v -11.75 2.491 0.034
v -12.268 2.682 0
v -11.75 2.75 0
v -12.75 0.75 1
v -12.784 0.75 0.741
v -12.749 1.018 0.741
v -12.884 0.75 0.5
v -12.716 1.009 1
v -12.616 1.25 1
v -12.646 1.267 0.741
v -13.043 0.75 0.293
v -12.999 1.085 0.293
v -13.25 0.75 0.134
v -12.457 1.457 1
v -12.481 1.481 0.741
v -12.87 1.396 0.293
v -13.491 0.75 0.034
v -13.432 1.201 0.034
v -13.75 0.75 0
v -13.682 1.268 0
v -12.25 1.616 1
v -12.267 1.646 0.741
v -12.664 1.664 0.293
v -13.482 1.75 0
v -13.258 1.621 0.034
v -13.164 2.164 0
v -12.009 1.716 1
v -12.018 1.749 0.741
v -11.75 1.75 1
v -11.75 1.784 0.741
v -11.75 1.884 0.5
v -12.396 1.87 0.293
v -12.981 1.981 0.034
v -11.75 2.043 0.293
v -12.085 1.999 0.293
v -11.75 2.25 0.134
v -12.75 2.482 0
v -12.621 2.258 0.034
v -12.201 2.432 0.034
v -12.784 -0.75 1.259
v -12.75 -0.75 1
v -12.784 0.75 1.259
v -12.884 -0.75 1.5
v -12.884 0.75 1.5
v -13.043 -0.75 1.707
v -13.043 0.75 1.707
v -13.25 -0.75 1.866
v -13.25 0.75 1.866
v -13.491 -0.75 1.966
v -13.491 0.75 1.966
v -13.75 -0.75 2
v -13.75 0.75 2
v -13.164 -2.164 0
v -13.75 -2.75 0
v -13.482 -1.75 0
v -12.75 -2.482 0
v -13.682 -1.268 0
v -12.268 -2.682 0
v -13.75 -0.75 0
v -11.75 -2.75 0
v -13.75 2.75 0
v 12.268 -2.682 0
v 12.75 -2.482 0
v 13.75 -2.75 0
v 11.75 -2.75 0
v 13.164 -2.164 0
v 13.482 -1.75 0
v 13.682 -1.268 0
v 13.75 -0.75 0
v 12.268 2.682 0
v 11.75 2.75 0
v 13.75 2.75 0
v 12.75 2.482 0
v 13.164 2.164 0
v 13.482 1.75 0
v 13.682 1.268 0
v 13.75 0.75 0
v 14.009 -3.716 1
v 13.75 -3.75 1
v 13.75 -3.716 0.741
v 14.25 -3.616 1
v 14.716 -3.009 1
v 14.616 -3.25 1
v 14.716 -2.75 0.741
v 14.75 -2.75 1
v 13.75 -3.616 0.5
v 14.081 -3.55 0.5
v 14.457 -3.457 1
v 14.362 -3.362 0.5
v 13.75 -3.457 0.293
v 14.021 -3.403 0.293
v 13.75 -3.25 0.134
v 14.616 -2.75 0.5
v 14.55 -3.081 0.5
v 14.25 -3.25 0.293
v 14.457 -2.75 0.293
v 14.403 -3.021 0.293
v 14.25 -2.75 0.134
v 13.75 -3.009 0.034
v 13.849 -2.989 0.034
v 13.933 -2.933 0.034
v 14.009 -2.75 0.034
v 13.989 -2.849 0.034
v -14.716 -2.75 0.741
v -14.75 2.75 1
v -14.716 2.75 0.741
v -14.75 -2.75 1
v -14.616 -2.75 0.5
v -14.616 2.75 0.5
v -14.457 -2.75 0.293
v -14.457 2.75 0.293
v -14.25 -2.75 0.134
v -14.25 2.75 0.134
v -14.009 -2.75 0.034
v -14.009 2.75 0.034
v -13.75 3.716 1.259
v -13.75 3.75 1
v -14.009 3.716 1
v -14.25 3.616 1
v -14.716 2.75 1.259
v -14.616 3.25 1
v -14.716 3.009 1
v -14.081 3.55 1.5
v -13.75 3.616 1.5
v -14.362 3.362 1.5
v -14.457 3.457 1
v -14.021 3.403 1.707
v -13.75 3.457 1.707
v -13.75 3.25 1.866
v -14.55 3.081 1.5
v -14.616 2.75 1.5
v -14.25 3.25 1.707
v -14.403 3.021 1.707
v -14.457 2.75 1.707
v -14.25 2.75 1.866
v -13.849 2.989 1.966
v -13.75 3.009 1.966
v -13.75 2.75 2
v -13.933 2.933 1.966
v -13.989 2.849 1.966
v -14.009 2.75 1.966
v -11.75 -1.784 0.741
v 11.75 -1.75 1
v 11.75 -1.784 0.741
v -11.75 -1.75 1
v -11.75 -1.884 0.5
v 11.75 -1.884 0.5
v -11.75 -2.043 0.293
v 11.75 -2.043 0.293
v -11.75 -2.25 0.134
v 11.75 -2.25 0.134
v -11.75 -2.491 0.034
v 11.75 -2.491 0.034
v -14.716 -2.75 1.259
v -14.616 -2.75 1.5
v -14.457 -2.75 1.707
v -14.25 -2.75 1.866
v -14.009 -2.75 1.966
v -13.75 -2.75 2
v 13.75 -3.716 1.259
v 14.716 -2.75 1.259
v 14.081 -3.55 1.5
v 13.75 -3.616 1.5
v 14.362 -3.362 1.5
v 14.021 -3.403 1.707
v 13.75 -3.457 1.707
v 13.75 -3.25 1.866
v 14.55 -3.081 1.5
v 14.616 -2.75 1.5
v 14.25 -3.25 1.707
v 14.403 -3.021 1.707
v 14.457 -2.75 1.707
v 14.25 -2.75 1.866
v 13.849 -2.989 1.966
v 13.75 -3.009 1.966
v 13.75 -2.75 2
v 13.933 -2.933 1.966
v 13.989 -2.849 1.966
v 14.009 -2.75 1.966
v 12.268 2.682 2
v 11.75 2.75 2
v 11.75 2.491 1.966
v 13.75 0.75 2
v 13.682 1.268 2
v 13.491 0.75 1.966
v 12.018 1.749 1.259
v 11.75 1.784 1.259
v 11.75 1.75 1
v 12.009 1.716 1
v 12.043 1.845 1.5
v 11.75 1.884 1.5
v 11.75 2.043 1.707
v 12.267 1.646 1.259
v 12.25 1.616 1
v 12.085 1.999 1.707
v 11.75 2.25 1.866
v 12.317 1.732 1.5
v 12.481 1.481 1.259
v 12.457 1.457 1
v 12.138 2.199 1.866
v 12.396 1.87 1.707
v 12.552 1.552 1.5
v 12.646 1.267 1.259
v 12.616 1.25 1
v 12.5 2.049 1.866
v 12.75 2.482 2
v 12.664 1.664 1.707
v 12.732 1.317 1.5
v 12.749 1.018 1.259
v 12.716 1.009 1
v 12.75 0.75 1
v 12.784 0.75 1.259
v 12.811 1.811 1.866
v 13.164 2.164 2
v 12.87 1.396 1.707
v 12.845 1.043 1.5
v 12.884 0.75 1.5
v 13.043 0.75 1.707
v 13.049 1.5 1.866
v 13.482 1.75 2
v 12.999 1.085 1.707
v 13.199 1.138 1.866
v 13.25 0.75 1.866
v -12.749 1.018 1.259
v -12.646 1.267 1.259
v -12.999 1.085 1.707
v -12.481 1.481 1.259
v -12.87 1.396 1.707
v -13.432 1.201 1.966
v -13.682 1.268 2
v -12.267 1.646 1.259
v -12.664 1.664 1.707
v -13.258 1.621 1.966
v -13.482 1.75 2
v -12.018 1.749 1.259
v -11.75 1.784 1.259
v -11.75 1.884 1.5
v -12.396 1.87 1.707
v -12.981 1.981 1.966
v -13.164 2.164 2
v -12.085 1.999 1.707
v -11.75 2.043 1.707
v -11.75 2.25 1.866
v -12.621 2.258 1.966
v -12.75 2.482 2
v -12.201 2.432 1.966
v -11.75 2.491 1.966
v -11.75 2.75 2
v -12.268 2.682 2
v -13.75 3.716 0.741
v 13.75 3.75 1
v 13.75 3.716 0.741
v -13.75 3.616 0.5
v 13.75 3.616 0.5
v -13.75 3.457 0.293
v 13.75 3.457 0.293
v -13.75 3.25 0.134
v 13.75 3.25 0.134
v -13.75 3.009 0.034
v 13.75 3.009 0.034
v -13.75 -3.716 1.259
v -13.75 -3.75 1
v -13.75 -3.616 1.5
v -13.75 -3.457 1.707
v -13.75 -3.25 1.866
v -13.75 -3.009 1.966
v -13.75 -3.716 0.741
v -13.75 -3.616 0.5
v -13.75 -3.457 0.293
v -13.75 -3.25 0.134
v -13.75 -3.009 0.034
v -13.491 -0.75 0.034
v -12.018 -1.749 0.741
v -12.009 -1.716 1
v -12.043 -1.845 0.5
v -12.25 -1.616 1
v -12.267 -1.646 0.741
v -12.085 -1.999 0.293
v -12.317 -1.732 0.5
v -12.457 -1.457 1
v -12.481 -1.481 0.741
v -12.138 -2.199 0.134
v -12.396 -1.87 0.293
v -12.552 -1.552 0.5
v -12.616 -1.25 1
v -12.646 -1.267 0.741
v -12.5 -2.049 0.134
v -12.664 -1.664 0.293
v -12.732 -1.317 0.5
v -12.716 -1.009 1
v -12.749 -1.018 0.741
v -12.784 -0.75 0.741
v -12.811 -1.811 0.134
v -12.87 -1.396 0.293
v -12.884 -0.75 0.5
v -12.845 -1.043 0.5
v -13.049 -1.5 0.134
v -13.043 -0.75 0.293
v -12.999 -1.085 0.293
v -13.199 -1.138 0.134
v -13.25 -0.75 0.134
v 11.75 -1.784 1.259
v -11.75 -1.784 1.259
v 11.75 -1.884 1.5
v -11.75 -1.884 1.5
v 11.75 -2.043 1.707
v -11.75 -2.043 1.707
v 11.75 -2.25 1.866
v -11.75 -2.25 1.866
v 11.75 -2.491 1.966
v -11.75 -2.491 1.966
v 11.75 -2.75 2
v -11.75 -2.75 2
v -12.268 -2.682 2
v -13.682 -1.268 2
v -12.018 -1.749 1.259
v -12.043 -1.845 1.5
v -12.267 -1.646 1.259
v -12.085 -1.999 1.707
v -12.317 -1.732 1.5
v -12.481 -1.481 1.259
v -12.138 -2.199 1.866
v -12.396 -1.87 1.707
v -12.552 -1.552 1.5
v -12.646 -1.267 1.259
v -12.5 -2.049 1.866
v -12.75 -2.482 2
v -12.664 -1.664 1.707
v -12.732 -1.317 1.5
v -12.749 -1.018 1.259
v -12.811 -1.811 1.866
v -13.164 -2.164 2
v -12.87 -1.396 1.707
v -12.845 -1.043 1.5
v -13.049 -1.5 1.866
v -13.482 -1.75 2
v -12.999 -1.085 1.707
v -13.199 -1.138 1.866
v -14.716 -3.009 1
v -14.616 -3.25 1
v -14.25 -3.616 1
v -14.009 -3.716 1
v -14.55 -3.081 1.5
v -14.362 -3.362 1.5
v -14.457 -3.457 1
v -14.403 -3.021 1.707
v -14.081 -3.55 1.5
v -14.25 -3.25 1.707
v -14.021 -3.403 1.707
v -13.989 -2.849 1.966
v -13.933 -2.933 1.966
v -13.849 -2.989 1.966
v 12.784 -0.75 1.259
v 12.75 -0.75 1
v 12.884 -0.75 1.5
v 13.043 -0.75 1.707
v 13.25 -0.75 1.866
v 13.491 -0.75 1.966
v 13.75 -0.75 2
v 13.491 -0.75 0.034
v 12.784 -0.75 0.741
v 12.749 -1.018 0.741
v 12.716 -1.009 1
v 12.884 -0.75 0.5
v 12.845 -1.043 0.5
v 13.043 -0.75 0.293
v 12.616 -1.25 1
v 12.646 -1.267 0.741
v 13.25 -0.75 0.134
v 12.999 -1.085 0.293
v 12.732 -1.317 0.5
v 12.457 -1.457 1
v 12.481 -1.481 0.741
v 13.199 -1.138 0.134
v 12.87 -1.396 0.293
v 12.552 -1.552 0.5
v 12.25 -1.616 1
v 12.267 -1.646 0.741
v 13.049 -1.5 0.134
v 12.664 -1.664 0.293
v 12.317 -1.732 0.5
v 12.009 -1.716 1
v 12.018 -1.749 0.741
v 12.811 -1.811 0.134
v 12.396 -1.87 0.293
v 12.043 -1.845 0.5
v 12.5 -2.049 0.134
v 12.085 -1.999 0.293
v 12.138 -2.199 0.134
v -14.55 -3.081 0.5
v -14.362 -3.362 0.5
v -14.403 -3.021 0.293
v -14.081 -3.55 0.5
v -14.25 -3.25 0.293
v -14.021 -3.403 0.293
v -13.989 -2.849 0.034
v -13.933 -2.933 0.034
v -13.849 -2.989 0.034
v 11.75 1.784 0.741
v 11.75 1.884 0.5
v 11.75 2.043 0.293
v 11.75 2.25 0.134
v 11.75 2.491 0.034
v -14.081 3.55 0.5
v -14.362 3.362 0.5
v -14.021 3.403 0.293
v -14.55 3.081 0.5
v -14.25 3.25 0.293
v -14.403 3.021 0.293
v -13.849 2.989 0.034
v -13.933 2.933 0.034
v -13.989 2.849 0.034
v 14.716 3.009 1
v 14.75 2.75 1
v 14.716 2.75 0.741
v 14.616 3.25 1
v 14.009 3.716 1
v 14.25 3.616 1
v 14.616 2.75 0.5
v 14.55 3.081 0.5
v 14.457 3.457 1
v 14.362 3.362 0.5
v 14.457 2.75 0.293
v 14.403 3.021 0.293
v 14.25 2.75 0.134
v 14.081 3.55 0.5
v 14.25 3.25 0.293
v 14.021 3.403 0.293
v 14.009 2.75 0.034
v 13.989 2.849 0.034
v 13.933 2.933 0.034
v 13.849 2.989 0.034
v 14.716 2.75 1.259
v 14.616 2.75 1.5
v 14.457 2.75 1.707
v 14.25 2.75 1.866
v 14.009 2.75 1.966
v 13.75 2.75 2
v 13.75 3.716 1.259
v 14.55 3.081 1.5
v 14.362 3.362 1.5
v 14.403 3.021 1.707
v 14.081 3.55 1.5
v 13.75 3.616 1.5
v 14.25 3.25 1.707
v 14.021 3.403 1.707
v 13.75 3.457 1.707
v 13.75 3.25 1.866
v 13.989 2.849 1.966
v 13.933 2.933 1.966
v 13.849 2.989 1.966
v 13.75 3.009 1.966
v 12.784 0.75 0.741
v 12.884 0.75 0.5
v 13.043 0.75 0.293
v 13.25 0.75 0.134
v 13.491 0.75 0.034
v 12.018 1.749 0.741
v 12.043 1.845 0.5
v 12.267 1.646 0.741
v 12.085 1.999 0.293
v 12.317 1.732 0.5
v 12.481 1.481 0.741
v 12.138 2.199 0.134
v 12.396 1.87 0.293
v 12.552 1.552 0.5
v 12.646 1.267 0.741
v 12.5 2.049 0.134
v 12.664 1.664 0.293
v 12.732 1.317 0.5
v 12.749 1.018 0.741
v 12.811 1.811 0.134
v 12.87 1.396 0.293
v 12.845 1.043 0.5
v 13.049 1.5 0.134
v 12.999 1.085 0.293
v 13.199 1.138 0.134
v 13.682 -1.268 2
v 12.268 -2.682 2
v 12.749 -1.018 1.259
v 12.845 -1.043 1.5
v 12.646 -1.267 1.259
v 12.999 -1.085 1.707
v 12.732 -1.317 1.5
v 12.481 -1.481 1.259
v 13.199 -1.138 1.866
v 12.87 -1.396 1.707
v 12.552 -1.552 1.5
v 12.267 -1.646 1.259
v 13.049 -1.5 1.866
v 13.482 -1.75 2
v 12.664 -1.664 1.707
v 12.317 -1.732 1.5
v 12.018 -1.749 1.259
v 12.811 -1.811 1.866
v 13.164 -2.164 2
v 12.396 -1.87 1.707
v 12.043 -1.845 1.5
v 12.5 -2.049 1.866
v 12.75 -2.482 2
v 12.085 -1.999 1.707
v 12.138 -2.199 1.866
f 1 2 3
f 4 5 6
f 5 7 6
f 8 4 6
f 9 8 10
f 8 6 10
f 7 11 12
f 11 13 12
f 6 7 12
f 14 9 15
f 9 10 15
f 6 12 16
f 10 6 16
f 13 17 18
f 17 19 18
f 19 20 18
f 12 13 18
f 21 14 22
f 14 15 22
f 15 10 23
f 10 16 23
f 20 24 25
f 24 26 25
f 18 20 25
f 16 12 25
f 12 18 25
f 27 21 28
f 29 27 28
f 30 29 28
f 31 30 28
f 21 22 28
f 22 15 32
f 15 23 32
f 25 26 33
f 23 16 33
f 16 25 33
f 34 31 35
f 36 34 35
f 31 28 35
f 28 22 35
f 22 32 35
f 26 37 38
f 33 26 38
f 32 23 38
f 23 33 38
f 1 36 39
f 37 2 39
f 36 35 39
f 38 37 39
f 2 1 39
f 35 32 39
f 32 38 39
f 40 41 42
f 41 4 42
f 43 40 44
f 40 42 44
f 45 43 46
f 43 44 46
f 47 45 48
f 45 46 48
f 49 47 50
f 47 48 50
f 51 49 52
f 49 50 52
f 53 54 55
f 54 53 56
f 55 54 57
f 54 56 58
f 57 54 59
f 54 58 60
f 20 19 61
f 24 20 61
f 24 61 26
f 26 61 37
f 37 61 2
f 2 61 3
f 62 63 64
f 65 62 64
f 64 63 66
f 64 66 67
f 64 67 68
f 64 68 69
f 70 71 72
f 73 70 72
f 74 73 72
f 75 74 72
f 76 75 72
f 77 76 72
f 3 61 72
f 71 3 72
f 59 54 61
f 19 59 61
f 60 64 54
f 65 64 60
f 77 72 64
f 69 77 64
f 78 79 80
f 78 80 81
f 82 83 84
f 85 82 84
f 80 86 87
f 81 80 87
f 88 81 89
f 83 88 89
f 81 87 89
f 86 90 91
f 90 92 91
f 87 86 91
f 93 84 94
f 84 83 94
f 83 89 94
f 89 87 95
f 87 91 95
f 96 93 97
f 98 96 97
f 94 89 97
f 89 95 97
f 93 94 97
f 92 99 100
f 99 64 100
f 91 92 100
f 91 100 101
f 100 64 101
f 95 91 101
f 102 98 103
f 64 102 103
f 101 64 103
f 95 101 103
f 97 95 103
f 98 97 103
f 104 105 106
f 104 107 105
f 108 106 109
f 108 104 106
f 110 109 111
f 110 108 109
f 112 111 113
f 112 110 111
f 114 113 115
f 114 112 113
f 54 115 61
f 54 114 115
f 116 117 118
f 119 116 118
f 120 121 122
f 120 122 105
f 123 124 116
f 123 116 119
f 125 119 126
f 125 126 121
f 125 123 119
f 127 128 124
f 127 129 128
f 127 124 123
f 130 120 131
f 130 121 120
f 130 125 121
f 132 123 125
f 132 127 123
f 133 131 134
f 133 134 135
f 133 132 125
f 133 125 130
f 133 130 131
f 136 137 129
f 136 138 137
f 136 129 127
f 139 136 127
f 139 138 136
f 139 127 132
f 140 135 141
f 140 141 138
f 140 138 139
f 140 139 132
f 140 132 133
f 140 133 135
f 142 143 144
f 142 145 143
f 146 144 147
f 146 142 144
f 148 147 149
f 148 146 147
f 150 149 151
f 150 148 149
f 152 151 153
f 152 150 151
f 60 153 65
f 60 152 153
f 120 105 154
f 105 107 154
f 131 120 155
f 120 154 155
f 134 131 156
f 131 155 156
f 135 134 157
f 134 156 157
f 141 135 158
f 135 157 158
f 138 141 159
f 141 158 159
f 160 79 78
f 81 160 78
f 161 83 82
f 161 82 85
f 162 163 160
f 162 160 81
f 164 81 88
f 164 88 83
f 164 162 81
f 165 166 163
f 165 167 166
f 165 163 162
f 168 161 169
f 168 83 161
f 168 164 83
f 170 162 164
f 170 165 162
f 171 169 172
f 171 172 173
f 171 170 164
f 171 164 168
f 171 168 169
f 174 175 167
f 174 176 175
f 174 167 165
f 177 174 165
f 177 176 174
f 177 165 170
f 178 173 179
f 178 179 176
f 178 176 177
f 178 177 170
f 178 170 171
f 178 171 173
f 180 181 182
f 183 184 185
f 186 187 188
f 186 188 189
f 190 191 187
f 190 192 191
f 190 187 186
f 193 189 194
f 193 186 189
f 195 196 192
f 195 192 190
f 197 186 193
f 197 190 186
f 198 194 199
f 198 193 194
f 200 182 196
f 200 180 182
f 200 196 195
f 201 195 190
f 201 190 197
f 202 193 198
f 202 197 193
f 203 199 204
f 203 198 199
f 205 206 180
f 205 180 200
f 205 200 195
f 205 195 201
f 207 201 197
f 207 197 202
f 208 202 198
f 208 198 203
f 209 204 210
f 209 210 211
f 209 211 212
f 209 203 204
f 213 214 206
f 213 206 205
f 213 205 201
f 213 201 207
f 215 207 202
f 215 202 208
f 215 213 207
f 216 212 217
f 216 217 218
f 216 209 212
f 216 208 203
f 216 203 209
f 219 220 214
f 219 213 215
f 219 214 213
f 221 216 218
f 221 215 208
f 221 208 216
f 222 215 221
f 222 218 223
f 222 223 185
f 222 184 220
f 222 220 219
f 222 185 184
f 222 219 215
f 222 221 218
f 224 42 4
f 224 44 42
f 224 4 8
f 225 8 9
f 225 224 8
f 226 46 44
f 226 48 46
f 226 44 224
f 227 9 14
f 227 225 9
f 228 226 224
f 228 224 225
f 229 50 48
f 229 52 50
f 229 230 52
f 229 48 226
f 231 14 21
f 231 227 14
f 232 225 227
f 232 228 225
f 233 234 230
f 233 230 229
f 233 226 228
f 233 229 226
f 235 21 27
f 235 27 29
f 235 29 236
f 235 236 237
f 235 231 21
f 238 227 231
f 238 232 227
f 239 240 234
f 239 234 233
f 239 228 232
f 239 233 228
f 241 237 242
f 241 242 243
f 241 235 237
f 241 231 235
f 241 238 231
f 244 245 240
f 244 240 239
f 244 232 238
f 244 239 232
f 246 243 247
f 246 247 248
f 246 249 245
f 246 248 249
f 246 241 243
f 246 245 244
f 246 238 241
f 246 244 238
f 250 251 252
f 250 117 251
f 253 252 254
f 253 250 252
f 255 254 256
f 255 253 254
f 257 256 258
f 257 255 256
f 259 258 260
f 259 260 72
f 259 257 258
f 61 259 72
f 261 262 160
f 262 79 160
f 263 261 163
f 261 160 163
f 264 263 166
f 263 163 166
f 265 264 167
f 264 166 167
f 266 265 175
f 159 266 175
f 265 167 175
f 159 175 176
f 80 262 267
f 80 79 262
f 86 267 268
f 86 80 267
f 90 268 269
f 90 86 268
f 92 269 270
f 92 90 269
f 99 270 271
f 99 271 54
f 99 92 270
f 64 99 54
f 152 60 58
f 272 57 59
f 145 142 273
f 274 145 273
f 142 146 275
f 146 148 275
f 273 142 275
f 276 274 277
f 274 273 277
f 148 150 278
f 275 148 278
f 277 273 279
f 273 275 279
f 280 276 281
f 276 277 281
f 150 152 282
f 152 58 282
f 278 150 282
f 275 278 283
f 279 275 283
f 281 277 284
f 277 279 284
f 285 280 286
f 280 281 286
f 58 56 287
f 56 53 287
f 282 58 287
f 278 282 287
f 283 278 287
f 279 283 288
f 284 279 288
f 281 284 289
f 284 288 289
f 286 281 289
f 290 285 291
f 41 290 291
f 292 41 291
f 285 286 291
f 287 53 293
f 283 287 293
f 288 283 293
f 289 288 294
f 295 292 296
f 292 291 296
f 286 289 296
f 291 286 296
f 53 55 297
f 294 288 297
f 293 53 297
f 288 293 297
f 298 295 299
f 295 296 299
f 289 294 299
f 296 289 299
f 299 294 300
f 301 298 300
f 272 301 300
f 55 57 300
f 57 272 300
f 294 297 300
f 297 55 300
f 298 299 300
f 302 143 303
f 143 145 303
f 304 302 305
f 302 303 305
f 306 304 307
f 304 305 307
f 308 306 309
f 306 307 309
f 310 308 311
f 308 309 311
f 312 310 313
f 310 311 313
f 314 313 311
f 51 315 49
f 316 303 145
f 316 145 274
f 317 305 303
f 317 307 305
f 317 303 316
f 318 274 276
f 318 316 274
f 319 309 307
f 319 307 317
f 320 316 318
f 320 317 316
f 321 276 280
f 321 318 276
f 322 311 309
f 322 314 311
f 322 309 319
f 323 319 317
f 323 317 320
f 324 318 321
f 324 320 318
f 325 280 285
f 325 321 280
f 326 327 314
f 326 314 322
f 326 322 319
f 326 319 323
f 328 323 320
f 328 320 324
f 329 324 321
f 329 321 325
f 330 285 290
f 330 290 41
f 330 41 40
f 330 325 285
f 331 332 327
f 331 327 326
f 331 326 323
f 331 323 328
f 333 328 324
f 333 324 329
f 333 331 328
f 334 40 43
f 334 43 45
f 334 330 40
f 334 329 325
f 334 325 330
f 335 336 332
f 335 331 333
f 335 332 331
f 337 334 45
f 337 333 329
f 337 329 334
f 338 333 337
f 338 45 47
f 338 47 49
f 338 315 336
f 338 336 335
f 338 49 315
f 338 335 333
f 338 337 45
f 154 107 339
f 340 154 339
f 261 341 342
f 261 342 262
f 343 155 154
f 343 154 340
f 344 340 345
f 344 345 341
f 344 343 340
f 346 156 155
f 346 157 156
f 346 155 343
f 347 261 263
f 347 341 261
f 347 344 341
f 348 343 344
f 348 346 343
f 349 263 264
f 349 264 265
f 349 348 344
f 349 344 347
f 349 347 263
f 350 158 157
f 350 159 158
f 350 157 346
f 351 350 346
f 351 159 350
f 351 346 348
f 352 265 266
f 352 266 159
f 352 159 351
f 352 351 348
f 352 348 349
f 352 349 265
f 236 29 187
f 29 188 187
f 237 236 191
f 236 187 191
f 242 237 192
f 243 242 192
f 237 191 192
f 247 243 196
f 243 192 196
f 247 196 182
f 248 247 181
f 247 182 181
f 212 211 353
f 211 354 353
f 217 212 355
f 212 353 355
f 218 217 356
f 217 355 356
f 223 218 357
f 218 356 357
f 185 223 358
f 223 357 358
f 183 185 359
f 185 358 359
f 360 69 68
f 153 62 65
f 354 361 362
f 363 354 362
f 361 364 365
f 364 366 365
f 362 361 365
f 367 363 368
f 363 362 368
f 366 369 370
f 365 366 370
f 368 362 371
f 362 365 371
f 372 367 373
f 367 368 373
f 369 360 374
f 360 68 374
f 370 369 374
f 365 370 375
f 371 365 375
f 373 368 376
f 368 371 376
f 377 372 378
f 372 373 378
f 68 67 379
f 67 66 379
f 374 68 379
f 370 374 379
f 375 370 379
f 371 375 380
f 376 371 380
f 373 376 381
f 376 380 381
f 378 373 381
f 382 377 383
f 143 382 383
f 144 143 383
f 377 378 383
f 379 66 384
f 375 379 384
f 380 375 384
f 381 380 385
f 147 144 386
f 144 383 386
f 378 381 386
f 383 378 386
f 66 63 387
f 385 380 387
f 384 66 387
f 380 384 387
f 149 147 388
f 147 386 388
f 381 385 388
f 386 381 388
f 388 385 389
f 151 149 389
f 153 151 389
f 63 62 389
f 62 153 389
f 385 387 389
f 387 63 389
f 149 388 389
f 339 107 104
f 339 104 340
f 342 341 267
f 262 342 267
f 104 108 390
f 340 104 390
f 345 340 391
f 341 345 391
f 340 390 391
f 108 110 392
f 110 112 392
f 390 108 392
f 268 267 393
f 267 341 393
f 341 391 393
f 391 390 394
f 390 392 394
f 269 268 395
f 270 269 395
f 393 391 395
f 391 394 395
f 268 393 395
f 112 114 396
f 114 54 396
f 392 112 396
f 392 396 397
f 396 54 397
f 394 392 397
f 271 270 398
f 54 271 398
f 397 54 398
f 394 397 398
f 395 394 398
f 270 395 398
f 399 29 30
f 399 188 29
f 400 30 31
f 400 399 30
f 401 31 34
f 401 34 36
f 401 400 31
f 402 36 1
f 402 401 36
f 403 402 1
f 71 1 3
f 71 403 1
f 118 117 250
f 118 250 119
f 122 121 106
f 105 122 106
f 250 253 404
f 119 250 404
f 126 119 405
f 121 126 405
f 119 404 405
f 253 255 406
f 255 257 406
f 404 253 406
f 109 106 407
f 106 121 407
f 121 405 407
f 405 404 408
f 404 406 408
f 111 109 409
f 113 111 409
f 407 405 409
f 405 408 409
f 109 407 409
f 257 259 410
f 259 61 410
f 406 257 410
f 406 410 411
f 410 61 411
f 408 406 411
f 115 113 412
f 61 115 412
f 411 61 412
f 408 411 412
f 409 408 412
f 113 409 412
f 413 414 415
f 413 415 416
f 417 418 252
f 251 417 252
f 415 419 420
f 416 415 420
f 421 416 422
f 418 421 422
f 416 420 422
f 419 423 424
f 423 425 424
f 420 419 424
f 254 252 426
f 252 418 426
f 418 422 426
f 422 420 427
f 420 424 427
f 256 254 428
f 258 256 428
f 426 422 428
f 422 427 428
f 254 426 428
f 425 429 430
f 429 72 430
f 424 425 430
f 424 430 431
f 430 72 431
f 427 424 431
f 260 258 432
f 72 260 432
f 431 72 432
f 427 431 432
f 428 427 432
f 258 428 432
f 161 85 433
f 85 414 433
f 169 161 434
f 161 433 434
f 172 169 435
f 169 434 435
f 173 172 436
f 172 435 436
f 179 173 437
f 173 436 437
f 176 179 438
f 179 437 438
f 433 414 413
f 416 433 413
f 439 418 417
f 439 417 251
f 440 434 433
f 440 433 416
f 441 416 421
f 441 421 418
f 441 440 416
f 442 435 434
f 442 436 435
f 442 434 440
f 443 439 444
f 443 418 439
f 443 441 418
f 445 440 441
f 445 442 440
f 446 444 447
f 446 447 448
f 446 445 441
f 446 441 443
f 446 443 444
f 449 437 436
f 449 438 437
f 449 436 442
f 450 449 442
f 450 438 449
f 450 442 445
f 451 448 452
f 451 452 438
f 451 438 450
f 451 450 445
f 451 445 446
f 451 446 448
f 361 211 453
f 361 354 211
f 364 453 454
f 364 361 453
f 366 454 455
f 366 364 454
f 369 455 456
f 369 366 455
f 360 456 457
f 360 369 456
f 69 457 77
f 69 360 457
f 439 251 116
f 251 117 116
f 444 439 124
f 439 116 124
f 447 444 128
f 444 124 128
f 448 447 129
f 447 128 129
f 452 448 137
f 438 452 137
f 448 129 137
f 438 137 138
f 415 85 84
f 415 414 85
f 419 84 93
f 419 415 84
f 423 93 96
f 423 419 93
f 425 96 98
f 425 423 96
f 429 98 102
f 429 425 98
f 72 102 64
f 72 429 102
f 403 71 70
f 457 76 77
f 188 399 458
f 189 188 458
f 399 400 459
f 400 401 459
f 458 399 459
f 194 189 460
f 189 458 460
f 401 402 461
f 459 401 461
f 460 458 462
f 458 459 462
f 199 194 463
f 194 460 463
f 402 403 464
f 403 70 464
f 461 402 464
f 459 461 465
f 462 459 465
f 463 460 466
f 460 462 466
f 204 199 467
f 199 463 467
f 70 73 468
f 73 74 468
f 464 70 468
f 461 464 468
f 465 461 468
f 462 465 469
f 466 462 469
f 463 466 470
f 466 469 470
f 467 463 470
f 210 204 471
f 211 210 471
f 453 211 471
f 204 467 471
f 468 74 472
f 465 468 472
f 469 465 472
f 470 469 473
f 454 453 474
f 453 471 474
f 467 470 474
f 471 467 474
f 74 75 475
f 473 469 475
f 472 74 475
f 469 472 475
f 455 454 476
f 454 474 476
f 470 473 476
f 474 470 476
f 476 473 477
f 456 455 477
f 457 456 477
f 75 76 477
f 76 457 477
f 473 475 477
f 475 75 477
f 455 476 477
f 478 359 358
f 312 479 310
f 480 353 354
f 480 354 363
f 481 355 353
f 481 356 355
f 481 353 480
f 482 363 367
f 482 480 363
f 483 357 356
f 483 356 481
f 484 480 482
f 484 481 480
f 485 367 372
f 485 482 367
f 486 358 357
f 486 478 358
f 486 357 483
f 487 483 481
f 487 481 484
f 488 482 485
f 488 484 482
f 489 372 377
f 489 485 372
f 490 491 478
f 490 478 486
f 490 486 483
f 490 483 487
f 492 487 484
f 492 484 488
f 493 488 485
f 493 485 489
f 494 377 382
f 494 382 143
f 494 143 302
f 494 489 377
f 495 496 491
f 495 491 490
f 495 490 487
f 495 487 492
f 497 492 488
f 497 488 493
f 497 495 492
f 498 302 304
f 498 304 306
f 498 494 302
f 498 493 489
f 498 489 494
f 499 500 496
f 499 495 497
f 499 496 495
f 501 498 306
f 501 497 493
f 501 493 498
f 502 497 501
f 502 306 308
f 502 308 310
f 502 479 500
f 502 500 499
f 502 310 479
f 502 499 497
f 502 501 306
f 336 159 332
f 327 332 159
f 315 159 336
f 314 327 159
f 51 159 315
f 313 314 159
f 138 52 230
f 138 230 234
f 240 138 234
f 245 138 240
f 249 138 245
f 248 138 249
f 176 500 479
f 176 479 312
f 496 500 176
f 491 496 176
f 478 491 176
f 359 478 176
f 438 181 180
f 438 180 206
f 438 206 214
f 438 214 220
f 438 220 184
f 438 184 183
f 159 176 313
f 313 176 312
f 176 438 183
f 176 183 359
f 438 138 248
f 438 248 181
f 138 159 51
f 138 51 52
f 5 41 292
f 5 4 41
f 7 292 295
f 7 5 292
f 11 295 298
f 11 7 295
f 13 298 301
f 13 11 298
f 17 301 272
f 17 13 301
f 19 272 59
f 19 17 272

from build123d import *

# Parameters (mm, degrees)
F1_DEPTH = 2
F2_R     = 0.99999


# Not quite as in the source:
# - a fillet or chamfer is up to 0.001 mm smaller than in the source, because OpenCascade refuses the exact size


with BuildPart() as f1:
    # F0 (on Top) → F1 (new body)
    with BuildSketch(Plane.XY):
        with BuildLine():
            ThreePointArc((-13.75, 3.75), (-14.4571067812, 3.4571067812), (-14.75, 2.75))
            Line((-14.75, 2.75), (-14.75, -2.75))
            ThreePointArc((-14.75, -2.75), (-14.4571067812, -3.4571067812), (-13.75, -3.75))
            Line((-13.75, -3.75), (13.75, -3.75))
            ThreePointArc((13.75, -3.75), (14.4571067812, -3.4571067812), (14.75, -2.75))
            Line((14.75, -2.75), (14.75, 2.75))
            ThreePointArc((14.75, 2.75), (14.4571067812, 3.4571067812), (13.75, 3.75))
            Line((13.75, 3.75), (-13.75, 3.75))
        make_face()
        with BuildLine():
            Line((-11.75, 1.75), (11.75, 1.75))
            ThreePointArc((11.75, 1.75), (12.4571067812, 1.4571067812), (12.75, 0.75))
            Line((12.75, 0.75), (12.75, -0.75))
            ThreePointArc((12.75, -0.75), (12.4571067812, -1.4571067812), (11.75, -1.75))
            Line((11.75, -1.75), (-11.75, -1.75))
            ThreePointArc((-11.75, -1.75), (-12.4571067812, -1.4571067812), (-12.75, -0.75))
            Line((-12.75, -0.75), (-12.75, 0.75))
            ThreePointArc((-12.75, 0.75), (-12.4571067812, 1.4571067812), (-11.75, 1.75))
        make_face(mode=Mode.SUBTRACT)
    extrude(amount=F1_DEPTH)

    # F2 (radius 1 in the source; OpenCascade refuses exactly that, so slightly less here)
    f2_edges = [f1.edges().sort_by_distance(p)[0] for p in [
        (0, 1.75, 2),
        (0, 1.75, 0),
        (0, 3.75, 0),
        (0, -3.75, 2),
    ]]
    fillet(f2_edges, radius=F2_R)


solid = f1.part
